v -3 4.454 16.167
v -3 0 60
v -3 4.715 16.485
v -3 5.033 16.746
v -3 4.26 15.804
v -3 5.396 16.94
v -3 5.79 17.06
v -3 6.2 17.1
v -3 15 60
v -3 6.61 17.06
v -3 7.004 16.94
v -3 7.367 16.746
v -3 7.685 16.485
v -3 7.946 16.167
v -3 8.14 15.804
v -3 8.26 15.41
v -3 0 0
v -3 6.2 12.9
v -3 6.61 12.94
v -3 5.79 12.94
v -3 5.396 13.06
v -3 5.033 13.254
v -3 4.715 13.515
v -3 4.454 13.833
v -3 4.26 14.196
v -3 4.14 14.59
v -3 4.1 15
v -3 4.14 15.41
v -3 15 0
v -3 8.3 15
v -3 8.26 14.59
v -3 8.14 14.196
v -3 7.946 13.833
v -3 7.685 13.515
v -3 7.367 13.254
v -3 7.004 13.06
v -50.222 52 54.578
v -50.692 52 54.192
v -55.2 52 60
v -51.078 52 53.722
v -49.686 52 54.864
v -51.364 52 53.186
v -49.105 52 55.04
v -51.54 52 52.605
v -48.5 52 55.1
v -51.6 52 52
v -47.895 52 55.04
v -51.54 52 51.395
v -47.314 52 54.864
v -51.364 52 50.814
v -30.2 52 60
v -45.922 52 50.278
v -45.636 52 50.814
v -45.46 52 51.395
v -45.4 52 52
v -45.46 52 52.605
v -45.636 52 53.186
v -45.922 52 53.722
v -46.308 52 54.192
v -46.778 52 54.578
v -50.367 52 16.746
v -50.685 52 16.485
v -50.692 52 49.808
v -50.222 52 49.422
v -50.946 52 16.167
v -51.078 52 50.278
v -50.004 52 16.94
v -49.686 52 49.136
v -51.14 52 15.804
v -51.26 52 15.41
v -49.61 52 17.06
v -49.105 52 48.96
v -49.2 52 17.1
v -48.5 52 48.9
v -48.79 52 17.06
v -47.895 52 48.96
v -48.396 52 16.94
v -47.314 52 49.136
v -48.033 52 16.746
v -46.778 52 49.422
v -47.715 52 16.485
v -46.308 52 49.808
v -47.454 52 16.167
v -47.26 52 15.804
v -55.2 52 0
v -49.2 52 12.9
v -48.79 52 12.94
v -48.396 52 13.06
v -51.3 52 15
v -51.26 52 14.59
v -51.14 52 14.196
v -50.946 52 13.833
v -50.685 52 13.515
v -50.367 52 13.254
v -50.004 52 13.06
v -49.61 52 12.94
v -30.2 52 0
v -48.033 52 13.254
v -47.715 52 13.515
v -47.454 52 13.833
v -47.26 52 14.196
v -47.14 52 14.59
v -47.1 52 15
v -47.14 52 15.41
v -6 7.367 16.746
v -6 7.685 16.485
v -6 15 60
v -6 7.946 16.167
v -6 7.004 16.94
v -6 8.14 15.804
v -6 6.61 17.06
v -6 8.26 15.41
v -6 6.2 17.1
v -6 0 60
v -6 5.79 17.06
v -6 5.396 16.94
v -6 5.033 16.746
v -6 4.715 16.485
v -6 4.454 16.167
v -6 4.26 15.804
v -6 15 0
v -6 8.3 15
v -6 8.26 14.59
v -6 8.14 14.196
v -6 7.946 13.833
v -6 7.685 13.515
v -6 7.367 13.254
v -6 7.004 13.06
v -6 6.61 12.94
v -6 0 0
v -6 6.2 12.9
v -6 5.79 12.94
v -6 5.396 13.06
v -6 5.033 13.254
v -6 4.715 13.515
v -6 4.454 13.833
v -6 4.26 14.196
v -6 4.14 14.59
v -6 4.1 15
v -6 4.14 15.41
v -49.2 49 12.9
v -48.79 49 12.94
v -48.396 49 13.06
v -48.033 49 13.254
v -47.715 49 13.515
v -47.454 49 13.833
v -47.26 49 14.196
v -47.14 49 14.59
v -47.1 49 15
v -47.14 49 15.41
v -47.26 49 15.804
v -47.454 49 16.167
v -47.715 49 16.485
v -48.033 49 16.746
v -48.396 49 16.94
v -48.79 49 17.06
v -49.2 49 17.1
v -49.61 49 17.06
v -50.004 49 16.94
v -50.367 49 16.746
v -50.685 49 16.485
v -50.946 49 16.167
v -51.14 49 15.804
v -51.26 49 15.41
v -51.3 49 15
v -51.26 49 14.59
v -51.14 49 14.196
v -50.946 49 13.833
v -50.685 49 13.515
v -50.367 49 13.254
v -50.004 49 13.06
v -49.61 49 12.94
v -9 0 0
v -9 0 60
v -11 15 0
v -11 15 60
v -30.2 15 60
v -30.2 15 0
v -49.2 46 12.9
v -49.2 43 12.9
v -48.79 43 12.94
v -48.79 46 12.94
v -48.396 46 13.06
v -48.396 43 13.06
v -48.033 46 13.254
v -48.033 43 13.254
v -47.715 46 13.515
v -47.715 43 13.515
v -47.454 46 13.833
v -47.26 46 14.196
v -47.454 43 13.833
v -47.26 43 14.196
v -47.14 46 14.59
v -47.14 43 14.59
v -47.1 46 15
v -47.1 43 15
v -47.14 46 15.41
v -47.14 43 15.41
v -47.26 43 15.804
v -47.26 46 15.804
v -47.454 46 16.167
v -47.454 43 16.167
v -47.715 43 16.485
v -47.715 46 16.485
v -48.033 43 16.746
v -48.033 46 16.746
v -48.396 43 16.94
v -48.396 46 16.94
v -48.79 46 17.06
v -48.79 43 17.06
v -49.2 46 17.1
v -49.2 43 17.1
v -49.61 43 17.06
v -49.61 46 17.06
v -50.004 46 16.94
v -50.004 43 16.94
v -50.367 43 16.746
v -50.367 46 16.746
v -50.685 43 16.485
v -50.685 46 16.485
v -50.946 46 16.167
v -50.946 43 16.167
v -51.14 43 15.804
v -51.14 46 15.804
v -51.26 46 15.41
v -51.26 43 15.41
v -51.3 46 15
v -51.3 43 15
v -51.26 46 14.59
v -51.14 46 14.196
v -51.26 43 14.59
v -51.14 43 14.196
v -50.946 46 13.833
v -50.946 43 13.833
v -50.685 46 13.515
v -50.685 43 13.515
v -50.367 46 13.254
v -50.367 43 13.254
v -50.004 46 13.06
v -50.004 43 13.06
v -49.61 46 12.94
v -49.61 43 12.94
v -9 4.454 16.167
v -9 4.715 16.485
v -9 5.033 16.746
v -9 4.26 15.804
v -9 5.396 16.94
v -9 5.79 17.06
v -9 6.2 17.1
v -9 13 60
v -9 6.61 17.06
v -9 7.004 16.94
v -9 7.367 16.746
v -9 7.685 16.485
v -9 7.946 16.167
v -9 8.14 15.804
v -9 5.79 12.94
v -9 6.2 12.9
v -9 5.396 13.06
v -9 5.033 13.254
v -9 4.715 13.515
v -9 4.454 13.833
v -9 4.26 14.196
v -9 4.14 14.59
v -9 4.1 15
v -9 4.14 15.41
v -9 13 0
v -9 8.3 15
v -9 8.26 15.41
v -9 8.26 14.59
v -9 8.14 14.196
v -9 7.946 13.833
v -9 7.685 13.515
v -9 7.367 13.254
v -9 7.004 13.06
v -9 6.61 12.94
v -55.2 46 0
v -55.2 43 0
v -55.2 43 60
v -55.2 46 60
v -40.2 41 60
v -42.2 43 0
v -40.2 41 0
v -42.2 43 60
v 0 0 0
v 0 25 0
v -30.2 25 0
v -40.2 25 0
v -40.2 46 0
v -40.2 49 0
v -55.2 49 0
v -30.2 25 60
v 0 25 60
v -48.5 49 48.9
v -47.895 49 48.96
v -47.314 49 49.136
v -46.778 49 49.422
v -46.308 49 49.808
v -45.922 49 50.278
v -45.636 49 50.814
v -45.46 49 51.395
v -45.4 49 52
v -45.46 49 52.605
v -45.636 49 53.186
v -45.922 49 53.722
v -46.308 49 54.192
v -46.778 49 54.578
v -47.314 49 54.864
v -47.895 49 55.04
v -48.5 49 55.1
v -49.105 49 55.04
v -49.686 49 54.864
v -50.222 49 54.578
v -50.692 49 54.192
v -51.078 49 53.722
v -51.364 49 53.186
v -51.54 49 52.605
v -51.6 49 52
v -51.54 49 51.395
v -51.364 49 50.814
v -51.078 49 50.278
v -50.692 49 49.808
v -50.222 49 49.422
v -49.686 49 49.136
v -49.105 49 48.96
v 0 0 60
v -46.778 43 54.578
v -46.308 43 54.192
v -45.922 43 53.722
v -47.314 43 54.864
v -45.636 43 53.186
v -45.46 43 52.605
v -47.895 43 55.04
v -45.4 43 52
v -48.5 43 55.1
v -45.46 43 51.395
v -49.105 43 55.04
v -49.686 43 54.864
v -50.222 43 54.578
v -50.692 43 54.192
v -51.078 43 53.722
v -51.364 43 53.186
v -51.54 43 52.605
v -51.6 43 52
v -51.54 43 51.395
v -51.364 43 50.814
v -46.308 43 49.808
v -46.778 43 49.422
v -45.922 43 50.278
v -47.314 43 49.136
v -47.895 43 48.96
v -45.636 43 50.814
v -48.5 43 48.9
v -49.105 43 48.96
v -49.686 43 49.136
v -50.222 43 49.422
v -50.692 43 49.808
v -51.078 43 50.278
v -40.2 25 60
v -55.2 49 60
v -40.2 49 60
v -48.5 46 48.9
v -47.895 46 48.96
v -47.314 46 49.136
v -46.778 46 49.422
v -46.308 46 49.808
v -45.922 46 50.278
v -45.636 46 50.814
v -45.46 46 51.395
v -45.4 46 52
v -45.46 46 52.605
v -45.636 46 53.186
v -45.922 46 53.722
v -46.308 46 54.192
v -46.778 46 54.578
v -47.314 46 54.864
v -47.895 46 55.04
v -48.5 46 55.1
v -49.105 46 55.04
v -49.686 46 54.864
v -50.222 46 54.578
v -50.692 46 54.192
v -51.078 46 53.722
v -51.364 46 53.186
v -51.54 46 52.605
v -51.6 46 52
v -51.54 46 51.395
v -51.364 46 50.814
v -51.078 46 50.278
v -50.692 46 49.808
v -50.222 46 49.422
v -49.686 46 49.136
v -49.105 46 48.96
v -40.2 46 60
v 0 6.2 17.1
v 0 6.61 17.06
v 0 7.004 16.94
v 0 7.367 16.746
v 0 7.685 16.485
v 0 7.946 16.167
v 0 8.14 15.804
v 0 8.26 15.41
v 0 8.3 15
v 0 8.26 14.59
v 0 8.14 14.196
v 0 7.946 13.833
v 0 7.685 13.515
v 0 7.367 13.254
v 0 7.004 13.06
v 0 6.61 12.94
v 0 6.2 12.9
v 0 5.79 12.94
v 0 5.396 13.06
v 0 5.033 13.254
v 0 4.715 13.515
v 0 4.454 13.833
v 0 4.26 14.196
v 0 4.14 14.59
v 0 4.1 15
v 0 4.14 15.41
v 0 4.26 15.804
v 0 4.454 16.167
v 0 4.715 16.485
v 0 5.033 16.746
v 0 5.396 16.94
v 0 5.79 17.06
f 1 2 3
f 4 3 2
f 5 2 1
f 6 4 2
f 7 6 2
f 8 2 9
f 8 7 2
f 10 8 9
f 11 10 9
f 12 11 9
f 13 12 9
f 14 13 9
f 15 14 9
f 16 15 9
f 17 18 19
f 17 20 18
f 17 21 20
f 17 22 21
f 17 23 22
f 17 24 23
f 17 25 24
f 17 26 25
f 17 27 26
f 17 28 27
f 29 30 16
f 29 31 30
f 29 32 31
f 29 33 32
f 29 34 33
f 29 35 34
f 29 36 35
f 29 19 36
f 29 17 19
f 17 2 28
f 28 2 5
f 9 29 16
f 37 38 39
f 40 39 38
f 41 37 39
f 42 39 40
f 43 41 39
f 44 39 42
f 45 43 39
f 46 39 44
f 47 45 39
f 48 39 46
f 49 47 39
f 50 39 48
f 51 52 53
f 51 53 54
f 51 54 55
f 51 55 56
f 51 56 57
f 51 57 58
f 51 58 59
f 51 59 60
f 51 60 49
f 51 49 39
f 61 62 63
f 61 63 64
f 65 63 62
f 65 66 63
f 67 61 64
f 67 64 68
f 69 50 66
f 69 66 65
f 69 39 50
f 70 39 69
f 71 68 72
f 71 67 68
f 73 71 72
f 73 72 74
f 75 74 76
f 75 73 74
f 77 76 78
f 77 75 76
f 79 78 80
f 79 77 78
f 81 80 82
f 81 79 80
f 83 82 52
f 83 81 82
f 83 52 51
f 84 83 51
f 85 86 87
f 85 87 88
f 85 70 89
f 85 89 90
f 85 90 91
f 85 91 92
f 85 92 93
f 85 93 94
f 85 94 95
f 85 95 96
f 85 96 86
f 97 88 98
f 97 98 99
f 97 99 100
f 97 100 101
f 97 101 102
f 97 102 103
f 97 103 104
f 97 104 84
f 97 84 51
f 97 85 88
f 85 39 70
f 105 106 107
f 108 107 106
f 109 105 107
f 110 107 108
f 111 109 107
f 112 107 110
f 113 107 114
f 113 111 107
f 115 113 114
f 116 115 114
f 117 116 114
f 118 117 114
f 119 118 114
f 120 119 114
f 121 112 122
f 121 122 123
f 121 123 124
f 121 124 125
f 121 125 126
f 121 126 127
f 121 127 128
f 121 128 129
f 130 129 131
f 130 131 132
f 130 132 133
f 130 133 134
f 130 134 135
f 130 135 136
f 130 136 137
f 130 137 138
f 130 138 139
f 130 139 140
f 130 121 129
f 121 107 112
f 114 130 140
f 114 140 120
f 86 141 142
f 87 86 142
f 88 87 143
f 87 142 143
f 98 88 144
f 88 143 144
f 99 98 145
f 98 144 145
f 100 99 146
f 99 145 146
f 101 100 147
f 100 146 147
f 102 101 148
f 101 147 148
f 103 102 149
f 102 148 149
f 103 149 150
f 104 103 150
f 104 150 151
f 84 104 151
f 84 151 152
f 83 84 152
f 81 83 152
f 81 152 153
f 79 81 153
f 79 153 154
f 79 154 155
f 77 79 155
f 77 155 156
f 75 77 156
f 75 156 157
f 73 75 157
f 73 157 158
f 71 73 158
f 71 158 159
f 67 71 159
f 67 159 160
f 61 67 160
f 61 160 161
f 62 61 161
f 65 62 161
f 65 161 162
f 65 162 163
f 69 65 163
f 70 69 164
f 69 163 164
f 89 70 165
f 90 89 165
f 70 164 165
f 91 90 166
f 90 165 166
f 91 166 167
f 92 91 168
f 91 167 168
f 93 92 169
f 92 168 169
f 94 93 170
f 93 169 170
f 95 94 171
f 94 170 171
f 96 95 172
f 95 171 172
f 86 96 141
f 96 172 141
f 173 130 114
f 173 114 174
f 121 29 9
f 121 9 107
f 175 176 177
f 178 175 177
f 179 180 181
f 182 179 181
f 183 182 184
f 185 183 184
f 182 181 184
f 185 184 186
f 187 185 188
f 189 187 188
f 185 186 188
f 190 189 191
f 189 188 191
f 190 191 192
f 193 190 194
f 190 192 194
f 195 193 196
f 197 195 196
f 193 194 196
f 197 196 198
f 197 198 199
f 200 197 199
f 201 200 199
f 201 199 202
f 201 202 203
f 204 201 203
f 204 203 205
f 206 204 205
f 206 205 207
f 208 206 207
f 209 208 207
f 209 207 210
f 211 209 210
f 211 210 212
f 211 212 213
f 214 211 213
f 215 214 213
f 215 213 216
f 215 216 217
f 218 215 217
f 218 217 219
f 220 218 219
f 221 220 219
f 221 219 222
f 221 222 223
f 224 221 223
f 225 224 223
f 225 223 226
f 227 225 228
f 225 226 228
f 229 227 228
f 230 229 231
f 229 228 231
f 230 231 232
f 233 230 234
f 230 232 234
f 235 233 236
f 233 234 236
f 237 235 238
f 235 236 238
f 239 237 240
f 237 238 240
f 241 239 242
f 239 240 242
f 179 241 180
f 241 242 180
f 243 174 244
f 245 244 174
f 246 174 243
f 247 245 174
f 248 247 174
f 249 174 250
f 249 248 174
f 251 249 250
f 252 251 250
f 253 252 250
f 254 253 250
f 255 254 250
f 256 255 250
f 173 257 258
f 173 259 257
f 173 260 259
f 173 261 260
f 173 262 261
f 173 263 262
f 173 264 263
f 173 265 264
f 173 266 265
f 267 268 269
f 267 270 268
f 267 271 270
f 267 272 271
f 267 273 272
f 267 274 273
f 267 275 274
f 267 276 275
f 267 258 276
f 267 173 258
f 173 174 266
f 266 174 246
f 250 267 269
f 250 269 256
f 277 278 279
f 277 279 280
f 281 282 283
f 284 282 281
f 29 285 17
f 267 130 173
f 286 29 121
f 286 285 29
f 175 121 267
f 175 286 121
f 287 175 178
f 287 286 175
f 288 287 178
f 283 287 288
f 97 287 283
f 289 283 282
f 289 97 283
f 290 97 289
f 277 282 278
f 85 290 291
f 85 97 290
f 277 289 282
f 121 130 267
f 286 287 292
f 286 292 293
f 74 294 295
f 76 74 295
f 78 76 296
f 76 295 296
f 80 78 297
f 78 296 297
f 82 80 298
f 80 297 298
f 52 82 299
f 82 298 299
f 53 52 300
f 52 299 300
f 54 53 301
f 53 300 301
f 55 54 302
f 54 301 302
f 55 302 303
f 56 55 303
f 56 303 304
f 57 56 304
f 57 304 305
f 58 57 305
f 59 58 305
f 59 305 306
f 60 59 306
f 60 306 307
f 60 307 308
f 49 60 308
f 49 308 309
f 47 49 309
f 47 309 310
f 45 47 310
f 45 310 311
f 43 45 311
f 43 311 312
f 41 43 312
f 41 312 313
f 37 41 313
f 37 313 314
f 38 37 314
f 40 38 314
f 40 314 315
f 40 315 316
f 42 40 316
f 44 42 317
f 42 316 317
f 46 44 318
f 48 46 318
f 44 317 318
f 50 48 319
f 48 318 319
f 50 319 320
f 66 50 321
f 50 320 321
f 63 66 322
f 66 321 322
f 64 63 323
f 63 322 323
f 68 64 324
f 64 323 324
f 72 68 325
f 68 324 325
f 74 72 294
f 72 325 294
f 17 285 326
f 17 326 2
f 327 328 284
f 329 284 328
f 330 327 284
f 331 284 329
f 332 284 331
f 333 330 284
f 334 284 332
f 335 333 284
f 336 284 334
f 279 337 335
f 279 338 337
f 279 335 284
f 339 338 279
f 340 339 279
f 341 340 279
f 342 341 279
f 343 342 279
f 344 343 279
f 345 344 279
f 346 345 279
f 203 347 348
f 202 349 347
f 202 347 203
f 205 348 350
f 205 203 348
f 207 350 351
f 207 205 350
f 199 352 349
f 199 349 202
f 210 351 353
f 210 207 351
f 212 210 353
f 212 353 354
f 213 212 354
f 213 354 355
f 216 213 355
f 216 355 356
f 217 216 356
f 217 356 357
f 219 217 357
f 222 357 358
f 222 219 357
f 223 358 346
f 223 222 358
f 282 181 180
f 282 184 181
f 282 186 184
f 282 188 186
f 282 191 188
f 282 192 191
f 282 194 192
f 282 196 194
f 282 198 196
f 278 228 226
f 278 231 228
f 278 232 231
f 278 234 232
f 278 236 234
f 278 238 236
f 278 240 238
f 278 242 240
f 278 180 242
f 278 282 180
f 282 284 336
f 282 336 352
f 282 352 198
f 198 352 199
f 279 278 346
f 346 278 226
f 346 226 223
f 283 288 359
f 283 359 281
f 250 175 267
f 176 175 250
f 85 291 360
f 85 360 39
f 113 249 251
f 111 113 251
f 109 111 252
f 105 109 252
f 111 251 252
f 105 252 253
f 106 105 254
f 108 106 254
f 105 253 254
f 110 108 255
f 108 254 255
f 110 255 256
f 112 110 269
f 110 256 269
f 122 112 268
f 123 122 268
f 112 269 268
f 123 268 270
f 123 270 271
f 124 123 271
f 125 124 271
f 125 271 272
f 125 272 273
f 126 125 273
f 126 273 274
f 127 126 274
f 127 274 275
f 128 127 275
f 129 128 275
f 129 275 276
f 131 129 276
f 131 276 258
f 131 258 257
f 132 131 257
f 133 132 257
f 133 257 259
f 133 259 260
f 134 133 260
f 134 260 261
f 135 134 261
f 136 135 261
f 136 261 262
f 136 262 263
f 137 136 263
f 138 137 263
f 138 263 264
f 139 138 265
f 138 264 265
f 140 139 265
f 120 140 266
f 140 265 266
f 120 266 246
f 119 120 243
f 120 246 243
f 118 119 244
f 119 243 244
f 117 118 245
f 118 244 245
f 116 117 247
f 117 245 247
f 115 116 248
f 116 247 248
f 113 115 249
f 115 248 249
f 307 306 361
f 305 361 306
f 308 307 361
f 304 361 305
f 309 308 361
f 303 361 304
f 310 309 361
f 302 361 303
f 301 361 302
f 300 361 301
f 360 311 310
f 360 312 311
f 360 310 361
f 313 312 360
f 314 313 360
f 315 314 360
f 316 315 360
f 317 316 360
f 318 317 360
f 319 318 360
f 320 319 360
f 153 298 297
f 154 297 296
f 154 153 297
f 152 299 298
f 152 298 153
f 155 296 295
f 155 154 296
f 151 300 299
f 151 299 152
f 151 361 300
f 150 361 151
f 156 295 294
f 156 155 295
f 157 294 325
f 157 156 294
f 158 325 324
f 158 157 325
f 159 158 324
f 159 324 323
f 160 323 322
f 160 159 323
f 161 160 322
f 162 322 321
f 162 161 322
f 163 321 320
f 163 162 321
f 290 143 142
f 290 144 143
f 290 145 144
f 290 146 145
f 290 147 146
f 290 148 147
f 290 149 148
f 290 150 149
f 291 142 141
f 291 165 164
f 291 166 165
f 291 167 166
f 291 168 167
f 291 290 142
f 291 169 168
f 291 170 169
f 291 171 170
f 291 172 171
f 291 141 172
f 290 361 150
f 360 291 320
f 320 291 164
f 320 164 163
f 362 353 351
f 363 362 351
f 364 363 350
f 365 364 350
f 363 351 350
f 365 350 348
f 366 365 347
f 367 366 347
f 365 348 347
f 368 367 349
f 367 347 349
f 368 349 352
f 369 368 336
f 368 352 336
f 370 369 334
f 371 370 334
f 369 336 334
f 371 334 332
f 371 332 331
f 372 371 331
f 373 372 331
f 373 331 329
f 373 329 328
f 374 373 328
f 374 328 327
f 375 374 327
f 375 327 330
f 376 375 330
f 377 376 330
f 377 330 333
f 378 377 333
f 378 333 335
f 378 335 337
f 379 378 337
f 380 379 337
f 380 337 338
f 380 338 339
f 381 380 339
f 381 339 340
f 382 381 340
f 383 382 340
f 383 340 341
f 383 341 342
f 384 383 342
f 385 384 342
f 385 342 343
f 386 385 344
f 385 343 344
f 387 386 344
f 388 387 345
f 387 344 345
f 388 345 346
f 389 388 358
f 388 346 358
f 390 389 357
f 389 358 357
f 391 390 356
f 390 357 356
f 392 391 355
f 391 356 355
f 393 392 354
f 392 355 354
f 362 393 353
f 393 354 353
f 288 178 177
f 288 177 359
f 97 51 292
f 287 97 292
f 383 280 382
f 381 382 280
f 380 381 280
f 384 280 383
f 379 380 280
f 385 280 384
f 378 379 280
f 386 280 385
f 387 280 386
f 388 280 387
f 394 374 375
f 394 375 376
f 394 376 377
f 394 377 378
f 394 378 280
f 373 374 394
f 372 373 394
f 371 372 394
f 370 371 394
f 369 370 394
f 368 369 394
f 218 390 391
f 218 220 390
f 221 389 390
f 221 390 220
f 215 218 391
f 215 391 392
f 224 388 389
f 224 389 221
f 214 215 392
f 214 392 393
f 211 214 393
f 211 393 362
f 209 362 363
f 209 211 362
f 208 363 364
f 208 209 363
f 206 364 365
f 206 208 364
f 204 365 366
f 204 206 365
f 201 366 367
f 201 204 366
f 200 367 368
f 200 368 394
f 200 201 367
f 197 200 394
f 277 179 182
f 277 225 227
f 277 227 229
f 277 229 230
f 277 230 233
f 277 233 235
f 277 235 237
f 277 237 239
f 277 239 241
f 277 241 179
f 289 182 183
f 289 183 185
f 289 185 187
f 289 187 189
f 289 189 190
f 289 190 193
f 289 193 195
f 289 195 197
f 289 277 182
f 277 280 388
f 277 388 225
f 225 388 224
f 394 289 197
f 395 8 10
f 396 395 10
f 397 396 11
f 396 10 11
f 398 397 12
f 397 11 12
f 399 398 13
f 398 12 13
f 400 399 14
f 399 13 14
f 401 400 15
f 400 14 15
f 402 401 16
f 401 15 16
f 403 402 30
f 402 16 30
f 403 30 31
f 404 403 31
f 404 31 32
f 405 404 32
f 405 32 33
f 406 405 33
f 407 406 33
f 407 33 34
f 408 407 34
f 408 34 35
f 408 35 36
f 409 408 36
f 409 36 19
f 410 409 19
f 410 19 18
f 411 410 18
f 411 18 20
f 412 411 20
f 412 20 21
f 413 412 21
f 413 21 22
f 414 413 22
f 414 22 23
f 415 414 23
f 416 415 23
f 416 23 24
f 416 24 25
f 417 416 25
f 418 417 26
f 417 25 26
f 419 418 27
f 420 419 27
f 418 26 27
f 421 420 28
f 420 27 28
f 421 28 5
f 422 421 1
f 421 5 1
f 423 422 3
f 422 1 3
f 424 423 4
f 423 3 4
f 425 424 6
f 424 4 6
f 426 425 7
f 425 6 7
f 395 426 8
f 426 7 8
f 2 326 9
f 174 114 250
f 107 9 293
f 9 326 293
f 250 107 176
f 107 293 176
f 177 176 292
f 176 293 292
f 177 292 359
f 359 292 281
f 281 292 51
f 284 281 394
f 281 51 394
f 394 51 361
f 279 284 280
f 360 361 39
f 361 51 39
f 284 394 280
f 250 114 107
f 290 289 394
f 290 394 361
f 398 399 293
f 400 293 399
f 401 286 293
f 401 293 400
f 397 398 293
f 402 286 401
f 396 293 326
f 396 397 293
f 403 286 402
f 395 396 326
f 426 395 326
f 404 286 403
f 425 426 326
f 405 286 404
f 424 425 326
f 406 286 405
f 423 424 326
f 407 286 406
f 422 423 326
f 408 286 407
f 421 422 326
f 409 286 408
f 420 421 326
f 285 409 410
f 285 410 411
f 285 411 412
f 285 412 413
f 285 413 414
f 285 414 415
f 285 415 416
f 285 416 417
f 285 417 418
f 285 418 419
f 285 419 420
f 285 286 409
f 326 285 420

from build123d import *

# Parameters (mm, degrees)
DODANIE_WYCI_GNI_CIE1_DEPTH = 60
SFAZOWANIE1_SIZE            = 2
SZKIC2_R                    = 3.1
WYTNIJ_WYCI_GNI_CIE1_DEPTH  = 10
SZKIC3_R                    = 2.1
WYTNIJ_WYCI_GNI_CIE2_DEPTH  = 10
SZKIC4_R                    = 2.1
WYTNIJ_WYCI_GNI_CIE3_DEPTH  = 10


with BuildPart() as part:
    # Szkic1 → Dodanie-wyciągnięcie1 (new body)
    with BuildSketch(Plane.XY):
        Polygon((0, 0), (-3, 0), (-3, 15), (-6, 15), (-6, 0), (-9, 0), (-9, 15), (-30.2, 15), (-40.2, 25), (-40.2, 43), (-55.2, 43), (-55.2, 46), (-40.2, 46), (-40.2, 49), (-55.2, 49), (-55.2, 52), (-30.2, 52), (-30.2, 25), (0, 25), align=None)
    extrude(amount=DODANIE_WYCI_GNI_CIE1_DEPTH)

    # Sfazowanie1
    sfazowanie1_edges = [part.edges().sort_by_distance(p)[0] for p in [
        (-9, 15, 30),
        (-40.2, 43, 30),
    ]]
    chamfer(sfazowanie1_edges, length=SFAZOWANIE1_SIZE)

    # Szkic2 → Wytnij-wyciągnięcie1 (cut)
    with BuildSketch(Plane.XZ.offset(-43)):
        with Locations(Location((-48.5, 52, 0), (0, 0, 270))):
            Circle(SZKIC2_R)
    extrude(amount=-WYTNIJ_WYCI_GNI_CIE1_DEPTH, mode=Mode.SUBTRACT)

    # Szkic3 → Wytnij-wyciągnięcie2 (cut)
    with BuildSketch(Plane.XZ.offset(-43)):
        with Locations(Location((-49.2, 15, 0), (0, 0, 270))):
            Circle(SZKIC3_R)
    extrude(amount=-WYTNIJ_WYCI_GNI_CIE2_DEPTH, mode=Mode.SUBTRACT)

    # Szkic4 → Wytnij-wyciągnięcie3 (cut)
    with BuildSketch(Plane.ZY.offset(9)):
        with Locations((15, 6.2)):
            Circle(SZKIC4_R)
    extrude(amount=-WYTNIJ_WYCI_GNI_CIE3_DEPTH, mode=Mode.SUBTRACT)


solid = part.part
